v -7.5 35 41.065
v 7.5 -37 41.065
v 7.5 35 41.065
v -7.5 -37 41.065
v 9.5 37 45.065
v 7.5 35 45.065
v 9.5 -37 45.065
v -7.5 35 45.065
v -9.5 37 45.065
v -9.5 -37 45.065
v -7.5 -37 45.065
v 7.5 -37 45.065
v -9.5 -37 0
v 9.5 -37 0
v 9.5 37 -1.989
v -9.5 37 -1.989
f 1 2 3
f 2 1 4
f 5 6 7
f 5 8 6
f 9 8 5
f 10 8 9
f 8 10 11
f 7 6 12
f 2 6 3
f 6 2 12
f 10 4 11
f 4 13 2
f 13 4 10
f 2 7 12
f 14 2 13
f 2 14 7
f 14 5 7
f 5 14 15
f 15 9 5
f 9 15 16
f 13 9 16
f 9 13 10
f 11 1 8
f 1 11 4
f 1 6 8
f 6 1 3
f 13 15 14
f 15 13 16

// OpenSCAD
// Customize here
depth = 15;
width = 70;

// how thick are edges and base
thickness = 2;
edge_height = 4;

// optional screw plate on the back
screw_plate_enabled = false;
screw_diameter = 4;


// how much should the base be lifted, before additional angle
// (should not be less than thickness)
// lift = 1; // now calculated by floor slant angle

// which leg is this? (starting from the right, which is the zero point)
leg = 3;


// account for floor sag after angle adjustment...
// leg 1 = 0
// leg 2 = 3mm
// leg 3 = 0
sag_adjustment = 0;

// how much additional height should taller end add?
//wedge_depth = 3;


// offset 43mm @ 1600mm
// additional delta of 3mm @ 800mm

base_width = 1600; // adjacent
offset = 43; // opposite
// opposite/adjacent
slant = atan(offset/base_width);
echo("slant angle", slant);

// calculate size based on leg number
ds = (leg-1) * 800;
p1 = ds-width-thickness;
p2 = ds+thickness;

// tan A = opp/adj
// tan A * adj = opp

p2_offset = tan(slant) * p2;
echo(p2_offset);

p1_offset = tan(slant) * p1;
echo(p1_offset);

// lift will be the p1 height -- it's the shorter one, closer to the origin
// wedge depth is delta between the two

// calculated params
outer_depth = depth + thickness*2;
outer_width = width + thickness*2;


//base_height = lift;
base_height = p1_offset + sag_adjustment;


wedge_depth = p2_offset - p1_offset;


echo("leg", leg);
echo("sag adj", sag_adjustment);
echo("base height", base_height);
echo("wedge height", wedge_depth);


module cylinders(points, diameter, thickness){
    for (p=points){
        translate(p) cylinder(d=diameter, h=thickness, center=true, $fn=100);
    }
}

module flat_plate(points, diameter, thickness, hole_diameter){
    difference(){
        hull() cylinders(points, diameter, thickness);
        cylinders(points, hole_diameter, thickness+1);
    }
}
 /*
module plate(points, diameter, thickness, hole_diameter){
    difference(){
        hull() cylinders(points, diameter, thickness);
        cylinders(points, hole_diameter, thickness+1);
    }
}*/

module plate(width, depth, thickness, corner_radius){
    r = corner_radius;
    points = [[0+r,0+r], [0+r,width-r], [depth-r, width-r], [depth-r,0+r]];
    hull() cylinders(points, corner_radius*2, thickness);
}
 
module bar(length, width, thickness, hole_diameter){
    plate([[0,0,0], [length,0,0]], width, thickness, hole_diameter);
}


/*color("Wheat") difference() {
    translate([0,0,base_height]) linear_extrude(height=300,convexity=10) square([depth, width], true);
        
        // 1st hole
        translate([0,17.25,base_height+25])
              rotate([0,90,0]) cylinder(outer_depth, screw_diameter/2, screw_diameter/2, true,$fn=100);
        translate([0,-17.25,base_height+25])
              rotate([0,90,0]) cylinder(outer_depth, screw_diameter/2, screw_diameter/2, true,$fn=100);
    
    
        // 2nd hole
        translate([0,17.25,base_height+25+150])
              rotate([0,90,0]) cylinder(outer_depth, screw_diameter/2, screw_diameter/2, true,$fn=100);
        translate([0,-17.25,base_height+25+150])
              rotate([0,90,0]) cylinder(outer_depth, screw_diameter/2, screw_diameter/2, true,$fn=100);
    }
  */  


// the center point from the edge of the wood (vertically) of the first hole
hole_vertical_centre_start = 25;

padding = 7;
th = hole_vertical_centre_start-edge_height+screw_diameter/2+padding;
    
td = hole_vertical_centre_start+screw_diameter/2+padding;
    
hole_offset = 17.25;
holegap = hole_offset*2;
hw = holegap+screw_diameter+padding*2;

color([1,0,0,0.5])  {
    union() {
        difference() {
            
            union() {
                // base
                translate([0,0,base_height]) linear_extrude(height=edge_height,convexity=10){
                    difference() {
                        square([outer_depth, outer_width], true);
                        square([depth, width], true);
                        translate([0,outer_width/2*-1,0]) square([depth, width], true);
                    }
                }

                // flat base
                linear_extrude(height=base_height){
                    square([outer_depth, outer_width], true);
                }

                // wedge
                triangle_points = [[0,0],[0,outer_width],[wedge_depth,outer_width]];
                triangle_paths = [[0,1,2]];
                translate([outer_depth/2*-1,outer_width/2*-1,0]) rotate([0,90,0]) linear_extrude(height=outer_depth) {
                    polygon(triangle_points,triangle_paths,10);
                }
        
                
                // back screw plate
                if (screw_plate_enabled) {
                    echo("screw plate added:", screw_plate_enabled);
                    translate([depth/2+thickness/2,hw/2*-1,base_height]) rotate([0,270,0]) plate(hw, td, thickness, 3);
                }
                
            }
            
            // cut out screw holes
            translate([outer_depth/2,hole_offset,base_height+25])
              rotate([0,90,0]) cylinder(outer_depth, screw_diameter/2+0.5, screw_diameter/2+1, true,$fn=100);
            translate([outer_depth/2,hole_offset*-1,base_height+25])
              rotate([0,90,0]) cylinder(outer_depth, screw_diameter/2+0.5, screw_diameter/2+1, true,$fn=100);
            
        }
        
        
        
        
    }
}




/*color([1,0,0,0.5]) translate([0,0,base_height+edge_height]) linear_extrude(height=th){
            translate([depth/2+thickness/2,0,0]) square([thickness, hw], true);
        }*/
